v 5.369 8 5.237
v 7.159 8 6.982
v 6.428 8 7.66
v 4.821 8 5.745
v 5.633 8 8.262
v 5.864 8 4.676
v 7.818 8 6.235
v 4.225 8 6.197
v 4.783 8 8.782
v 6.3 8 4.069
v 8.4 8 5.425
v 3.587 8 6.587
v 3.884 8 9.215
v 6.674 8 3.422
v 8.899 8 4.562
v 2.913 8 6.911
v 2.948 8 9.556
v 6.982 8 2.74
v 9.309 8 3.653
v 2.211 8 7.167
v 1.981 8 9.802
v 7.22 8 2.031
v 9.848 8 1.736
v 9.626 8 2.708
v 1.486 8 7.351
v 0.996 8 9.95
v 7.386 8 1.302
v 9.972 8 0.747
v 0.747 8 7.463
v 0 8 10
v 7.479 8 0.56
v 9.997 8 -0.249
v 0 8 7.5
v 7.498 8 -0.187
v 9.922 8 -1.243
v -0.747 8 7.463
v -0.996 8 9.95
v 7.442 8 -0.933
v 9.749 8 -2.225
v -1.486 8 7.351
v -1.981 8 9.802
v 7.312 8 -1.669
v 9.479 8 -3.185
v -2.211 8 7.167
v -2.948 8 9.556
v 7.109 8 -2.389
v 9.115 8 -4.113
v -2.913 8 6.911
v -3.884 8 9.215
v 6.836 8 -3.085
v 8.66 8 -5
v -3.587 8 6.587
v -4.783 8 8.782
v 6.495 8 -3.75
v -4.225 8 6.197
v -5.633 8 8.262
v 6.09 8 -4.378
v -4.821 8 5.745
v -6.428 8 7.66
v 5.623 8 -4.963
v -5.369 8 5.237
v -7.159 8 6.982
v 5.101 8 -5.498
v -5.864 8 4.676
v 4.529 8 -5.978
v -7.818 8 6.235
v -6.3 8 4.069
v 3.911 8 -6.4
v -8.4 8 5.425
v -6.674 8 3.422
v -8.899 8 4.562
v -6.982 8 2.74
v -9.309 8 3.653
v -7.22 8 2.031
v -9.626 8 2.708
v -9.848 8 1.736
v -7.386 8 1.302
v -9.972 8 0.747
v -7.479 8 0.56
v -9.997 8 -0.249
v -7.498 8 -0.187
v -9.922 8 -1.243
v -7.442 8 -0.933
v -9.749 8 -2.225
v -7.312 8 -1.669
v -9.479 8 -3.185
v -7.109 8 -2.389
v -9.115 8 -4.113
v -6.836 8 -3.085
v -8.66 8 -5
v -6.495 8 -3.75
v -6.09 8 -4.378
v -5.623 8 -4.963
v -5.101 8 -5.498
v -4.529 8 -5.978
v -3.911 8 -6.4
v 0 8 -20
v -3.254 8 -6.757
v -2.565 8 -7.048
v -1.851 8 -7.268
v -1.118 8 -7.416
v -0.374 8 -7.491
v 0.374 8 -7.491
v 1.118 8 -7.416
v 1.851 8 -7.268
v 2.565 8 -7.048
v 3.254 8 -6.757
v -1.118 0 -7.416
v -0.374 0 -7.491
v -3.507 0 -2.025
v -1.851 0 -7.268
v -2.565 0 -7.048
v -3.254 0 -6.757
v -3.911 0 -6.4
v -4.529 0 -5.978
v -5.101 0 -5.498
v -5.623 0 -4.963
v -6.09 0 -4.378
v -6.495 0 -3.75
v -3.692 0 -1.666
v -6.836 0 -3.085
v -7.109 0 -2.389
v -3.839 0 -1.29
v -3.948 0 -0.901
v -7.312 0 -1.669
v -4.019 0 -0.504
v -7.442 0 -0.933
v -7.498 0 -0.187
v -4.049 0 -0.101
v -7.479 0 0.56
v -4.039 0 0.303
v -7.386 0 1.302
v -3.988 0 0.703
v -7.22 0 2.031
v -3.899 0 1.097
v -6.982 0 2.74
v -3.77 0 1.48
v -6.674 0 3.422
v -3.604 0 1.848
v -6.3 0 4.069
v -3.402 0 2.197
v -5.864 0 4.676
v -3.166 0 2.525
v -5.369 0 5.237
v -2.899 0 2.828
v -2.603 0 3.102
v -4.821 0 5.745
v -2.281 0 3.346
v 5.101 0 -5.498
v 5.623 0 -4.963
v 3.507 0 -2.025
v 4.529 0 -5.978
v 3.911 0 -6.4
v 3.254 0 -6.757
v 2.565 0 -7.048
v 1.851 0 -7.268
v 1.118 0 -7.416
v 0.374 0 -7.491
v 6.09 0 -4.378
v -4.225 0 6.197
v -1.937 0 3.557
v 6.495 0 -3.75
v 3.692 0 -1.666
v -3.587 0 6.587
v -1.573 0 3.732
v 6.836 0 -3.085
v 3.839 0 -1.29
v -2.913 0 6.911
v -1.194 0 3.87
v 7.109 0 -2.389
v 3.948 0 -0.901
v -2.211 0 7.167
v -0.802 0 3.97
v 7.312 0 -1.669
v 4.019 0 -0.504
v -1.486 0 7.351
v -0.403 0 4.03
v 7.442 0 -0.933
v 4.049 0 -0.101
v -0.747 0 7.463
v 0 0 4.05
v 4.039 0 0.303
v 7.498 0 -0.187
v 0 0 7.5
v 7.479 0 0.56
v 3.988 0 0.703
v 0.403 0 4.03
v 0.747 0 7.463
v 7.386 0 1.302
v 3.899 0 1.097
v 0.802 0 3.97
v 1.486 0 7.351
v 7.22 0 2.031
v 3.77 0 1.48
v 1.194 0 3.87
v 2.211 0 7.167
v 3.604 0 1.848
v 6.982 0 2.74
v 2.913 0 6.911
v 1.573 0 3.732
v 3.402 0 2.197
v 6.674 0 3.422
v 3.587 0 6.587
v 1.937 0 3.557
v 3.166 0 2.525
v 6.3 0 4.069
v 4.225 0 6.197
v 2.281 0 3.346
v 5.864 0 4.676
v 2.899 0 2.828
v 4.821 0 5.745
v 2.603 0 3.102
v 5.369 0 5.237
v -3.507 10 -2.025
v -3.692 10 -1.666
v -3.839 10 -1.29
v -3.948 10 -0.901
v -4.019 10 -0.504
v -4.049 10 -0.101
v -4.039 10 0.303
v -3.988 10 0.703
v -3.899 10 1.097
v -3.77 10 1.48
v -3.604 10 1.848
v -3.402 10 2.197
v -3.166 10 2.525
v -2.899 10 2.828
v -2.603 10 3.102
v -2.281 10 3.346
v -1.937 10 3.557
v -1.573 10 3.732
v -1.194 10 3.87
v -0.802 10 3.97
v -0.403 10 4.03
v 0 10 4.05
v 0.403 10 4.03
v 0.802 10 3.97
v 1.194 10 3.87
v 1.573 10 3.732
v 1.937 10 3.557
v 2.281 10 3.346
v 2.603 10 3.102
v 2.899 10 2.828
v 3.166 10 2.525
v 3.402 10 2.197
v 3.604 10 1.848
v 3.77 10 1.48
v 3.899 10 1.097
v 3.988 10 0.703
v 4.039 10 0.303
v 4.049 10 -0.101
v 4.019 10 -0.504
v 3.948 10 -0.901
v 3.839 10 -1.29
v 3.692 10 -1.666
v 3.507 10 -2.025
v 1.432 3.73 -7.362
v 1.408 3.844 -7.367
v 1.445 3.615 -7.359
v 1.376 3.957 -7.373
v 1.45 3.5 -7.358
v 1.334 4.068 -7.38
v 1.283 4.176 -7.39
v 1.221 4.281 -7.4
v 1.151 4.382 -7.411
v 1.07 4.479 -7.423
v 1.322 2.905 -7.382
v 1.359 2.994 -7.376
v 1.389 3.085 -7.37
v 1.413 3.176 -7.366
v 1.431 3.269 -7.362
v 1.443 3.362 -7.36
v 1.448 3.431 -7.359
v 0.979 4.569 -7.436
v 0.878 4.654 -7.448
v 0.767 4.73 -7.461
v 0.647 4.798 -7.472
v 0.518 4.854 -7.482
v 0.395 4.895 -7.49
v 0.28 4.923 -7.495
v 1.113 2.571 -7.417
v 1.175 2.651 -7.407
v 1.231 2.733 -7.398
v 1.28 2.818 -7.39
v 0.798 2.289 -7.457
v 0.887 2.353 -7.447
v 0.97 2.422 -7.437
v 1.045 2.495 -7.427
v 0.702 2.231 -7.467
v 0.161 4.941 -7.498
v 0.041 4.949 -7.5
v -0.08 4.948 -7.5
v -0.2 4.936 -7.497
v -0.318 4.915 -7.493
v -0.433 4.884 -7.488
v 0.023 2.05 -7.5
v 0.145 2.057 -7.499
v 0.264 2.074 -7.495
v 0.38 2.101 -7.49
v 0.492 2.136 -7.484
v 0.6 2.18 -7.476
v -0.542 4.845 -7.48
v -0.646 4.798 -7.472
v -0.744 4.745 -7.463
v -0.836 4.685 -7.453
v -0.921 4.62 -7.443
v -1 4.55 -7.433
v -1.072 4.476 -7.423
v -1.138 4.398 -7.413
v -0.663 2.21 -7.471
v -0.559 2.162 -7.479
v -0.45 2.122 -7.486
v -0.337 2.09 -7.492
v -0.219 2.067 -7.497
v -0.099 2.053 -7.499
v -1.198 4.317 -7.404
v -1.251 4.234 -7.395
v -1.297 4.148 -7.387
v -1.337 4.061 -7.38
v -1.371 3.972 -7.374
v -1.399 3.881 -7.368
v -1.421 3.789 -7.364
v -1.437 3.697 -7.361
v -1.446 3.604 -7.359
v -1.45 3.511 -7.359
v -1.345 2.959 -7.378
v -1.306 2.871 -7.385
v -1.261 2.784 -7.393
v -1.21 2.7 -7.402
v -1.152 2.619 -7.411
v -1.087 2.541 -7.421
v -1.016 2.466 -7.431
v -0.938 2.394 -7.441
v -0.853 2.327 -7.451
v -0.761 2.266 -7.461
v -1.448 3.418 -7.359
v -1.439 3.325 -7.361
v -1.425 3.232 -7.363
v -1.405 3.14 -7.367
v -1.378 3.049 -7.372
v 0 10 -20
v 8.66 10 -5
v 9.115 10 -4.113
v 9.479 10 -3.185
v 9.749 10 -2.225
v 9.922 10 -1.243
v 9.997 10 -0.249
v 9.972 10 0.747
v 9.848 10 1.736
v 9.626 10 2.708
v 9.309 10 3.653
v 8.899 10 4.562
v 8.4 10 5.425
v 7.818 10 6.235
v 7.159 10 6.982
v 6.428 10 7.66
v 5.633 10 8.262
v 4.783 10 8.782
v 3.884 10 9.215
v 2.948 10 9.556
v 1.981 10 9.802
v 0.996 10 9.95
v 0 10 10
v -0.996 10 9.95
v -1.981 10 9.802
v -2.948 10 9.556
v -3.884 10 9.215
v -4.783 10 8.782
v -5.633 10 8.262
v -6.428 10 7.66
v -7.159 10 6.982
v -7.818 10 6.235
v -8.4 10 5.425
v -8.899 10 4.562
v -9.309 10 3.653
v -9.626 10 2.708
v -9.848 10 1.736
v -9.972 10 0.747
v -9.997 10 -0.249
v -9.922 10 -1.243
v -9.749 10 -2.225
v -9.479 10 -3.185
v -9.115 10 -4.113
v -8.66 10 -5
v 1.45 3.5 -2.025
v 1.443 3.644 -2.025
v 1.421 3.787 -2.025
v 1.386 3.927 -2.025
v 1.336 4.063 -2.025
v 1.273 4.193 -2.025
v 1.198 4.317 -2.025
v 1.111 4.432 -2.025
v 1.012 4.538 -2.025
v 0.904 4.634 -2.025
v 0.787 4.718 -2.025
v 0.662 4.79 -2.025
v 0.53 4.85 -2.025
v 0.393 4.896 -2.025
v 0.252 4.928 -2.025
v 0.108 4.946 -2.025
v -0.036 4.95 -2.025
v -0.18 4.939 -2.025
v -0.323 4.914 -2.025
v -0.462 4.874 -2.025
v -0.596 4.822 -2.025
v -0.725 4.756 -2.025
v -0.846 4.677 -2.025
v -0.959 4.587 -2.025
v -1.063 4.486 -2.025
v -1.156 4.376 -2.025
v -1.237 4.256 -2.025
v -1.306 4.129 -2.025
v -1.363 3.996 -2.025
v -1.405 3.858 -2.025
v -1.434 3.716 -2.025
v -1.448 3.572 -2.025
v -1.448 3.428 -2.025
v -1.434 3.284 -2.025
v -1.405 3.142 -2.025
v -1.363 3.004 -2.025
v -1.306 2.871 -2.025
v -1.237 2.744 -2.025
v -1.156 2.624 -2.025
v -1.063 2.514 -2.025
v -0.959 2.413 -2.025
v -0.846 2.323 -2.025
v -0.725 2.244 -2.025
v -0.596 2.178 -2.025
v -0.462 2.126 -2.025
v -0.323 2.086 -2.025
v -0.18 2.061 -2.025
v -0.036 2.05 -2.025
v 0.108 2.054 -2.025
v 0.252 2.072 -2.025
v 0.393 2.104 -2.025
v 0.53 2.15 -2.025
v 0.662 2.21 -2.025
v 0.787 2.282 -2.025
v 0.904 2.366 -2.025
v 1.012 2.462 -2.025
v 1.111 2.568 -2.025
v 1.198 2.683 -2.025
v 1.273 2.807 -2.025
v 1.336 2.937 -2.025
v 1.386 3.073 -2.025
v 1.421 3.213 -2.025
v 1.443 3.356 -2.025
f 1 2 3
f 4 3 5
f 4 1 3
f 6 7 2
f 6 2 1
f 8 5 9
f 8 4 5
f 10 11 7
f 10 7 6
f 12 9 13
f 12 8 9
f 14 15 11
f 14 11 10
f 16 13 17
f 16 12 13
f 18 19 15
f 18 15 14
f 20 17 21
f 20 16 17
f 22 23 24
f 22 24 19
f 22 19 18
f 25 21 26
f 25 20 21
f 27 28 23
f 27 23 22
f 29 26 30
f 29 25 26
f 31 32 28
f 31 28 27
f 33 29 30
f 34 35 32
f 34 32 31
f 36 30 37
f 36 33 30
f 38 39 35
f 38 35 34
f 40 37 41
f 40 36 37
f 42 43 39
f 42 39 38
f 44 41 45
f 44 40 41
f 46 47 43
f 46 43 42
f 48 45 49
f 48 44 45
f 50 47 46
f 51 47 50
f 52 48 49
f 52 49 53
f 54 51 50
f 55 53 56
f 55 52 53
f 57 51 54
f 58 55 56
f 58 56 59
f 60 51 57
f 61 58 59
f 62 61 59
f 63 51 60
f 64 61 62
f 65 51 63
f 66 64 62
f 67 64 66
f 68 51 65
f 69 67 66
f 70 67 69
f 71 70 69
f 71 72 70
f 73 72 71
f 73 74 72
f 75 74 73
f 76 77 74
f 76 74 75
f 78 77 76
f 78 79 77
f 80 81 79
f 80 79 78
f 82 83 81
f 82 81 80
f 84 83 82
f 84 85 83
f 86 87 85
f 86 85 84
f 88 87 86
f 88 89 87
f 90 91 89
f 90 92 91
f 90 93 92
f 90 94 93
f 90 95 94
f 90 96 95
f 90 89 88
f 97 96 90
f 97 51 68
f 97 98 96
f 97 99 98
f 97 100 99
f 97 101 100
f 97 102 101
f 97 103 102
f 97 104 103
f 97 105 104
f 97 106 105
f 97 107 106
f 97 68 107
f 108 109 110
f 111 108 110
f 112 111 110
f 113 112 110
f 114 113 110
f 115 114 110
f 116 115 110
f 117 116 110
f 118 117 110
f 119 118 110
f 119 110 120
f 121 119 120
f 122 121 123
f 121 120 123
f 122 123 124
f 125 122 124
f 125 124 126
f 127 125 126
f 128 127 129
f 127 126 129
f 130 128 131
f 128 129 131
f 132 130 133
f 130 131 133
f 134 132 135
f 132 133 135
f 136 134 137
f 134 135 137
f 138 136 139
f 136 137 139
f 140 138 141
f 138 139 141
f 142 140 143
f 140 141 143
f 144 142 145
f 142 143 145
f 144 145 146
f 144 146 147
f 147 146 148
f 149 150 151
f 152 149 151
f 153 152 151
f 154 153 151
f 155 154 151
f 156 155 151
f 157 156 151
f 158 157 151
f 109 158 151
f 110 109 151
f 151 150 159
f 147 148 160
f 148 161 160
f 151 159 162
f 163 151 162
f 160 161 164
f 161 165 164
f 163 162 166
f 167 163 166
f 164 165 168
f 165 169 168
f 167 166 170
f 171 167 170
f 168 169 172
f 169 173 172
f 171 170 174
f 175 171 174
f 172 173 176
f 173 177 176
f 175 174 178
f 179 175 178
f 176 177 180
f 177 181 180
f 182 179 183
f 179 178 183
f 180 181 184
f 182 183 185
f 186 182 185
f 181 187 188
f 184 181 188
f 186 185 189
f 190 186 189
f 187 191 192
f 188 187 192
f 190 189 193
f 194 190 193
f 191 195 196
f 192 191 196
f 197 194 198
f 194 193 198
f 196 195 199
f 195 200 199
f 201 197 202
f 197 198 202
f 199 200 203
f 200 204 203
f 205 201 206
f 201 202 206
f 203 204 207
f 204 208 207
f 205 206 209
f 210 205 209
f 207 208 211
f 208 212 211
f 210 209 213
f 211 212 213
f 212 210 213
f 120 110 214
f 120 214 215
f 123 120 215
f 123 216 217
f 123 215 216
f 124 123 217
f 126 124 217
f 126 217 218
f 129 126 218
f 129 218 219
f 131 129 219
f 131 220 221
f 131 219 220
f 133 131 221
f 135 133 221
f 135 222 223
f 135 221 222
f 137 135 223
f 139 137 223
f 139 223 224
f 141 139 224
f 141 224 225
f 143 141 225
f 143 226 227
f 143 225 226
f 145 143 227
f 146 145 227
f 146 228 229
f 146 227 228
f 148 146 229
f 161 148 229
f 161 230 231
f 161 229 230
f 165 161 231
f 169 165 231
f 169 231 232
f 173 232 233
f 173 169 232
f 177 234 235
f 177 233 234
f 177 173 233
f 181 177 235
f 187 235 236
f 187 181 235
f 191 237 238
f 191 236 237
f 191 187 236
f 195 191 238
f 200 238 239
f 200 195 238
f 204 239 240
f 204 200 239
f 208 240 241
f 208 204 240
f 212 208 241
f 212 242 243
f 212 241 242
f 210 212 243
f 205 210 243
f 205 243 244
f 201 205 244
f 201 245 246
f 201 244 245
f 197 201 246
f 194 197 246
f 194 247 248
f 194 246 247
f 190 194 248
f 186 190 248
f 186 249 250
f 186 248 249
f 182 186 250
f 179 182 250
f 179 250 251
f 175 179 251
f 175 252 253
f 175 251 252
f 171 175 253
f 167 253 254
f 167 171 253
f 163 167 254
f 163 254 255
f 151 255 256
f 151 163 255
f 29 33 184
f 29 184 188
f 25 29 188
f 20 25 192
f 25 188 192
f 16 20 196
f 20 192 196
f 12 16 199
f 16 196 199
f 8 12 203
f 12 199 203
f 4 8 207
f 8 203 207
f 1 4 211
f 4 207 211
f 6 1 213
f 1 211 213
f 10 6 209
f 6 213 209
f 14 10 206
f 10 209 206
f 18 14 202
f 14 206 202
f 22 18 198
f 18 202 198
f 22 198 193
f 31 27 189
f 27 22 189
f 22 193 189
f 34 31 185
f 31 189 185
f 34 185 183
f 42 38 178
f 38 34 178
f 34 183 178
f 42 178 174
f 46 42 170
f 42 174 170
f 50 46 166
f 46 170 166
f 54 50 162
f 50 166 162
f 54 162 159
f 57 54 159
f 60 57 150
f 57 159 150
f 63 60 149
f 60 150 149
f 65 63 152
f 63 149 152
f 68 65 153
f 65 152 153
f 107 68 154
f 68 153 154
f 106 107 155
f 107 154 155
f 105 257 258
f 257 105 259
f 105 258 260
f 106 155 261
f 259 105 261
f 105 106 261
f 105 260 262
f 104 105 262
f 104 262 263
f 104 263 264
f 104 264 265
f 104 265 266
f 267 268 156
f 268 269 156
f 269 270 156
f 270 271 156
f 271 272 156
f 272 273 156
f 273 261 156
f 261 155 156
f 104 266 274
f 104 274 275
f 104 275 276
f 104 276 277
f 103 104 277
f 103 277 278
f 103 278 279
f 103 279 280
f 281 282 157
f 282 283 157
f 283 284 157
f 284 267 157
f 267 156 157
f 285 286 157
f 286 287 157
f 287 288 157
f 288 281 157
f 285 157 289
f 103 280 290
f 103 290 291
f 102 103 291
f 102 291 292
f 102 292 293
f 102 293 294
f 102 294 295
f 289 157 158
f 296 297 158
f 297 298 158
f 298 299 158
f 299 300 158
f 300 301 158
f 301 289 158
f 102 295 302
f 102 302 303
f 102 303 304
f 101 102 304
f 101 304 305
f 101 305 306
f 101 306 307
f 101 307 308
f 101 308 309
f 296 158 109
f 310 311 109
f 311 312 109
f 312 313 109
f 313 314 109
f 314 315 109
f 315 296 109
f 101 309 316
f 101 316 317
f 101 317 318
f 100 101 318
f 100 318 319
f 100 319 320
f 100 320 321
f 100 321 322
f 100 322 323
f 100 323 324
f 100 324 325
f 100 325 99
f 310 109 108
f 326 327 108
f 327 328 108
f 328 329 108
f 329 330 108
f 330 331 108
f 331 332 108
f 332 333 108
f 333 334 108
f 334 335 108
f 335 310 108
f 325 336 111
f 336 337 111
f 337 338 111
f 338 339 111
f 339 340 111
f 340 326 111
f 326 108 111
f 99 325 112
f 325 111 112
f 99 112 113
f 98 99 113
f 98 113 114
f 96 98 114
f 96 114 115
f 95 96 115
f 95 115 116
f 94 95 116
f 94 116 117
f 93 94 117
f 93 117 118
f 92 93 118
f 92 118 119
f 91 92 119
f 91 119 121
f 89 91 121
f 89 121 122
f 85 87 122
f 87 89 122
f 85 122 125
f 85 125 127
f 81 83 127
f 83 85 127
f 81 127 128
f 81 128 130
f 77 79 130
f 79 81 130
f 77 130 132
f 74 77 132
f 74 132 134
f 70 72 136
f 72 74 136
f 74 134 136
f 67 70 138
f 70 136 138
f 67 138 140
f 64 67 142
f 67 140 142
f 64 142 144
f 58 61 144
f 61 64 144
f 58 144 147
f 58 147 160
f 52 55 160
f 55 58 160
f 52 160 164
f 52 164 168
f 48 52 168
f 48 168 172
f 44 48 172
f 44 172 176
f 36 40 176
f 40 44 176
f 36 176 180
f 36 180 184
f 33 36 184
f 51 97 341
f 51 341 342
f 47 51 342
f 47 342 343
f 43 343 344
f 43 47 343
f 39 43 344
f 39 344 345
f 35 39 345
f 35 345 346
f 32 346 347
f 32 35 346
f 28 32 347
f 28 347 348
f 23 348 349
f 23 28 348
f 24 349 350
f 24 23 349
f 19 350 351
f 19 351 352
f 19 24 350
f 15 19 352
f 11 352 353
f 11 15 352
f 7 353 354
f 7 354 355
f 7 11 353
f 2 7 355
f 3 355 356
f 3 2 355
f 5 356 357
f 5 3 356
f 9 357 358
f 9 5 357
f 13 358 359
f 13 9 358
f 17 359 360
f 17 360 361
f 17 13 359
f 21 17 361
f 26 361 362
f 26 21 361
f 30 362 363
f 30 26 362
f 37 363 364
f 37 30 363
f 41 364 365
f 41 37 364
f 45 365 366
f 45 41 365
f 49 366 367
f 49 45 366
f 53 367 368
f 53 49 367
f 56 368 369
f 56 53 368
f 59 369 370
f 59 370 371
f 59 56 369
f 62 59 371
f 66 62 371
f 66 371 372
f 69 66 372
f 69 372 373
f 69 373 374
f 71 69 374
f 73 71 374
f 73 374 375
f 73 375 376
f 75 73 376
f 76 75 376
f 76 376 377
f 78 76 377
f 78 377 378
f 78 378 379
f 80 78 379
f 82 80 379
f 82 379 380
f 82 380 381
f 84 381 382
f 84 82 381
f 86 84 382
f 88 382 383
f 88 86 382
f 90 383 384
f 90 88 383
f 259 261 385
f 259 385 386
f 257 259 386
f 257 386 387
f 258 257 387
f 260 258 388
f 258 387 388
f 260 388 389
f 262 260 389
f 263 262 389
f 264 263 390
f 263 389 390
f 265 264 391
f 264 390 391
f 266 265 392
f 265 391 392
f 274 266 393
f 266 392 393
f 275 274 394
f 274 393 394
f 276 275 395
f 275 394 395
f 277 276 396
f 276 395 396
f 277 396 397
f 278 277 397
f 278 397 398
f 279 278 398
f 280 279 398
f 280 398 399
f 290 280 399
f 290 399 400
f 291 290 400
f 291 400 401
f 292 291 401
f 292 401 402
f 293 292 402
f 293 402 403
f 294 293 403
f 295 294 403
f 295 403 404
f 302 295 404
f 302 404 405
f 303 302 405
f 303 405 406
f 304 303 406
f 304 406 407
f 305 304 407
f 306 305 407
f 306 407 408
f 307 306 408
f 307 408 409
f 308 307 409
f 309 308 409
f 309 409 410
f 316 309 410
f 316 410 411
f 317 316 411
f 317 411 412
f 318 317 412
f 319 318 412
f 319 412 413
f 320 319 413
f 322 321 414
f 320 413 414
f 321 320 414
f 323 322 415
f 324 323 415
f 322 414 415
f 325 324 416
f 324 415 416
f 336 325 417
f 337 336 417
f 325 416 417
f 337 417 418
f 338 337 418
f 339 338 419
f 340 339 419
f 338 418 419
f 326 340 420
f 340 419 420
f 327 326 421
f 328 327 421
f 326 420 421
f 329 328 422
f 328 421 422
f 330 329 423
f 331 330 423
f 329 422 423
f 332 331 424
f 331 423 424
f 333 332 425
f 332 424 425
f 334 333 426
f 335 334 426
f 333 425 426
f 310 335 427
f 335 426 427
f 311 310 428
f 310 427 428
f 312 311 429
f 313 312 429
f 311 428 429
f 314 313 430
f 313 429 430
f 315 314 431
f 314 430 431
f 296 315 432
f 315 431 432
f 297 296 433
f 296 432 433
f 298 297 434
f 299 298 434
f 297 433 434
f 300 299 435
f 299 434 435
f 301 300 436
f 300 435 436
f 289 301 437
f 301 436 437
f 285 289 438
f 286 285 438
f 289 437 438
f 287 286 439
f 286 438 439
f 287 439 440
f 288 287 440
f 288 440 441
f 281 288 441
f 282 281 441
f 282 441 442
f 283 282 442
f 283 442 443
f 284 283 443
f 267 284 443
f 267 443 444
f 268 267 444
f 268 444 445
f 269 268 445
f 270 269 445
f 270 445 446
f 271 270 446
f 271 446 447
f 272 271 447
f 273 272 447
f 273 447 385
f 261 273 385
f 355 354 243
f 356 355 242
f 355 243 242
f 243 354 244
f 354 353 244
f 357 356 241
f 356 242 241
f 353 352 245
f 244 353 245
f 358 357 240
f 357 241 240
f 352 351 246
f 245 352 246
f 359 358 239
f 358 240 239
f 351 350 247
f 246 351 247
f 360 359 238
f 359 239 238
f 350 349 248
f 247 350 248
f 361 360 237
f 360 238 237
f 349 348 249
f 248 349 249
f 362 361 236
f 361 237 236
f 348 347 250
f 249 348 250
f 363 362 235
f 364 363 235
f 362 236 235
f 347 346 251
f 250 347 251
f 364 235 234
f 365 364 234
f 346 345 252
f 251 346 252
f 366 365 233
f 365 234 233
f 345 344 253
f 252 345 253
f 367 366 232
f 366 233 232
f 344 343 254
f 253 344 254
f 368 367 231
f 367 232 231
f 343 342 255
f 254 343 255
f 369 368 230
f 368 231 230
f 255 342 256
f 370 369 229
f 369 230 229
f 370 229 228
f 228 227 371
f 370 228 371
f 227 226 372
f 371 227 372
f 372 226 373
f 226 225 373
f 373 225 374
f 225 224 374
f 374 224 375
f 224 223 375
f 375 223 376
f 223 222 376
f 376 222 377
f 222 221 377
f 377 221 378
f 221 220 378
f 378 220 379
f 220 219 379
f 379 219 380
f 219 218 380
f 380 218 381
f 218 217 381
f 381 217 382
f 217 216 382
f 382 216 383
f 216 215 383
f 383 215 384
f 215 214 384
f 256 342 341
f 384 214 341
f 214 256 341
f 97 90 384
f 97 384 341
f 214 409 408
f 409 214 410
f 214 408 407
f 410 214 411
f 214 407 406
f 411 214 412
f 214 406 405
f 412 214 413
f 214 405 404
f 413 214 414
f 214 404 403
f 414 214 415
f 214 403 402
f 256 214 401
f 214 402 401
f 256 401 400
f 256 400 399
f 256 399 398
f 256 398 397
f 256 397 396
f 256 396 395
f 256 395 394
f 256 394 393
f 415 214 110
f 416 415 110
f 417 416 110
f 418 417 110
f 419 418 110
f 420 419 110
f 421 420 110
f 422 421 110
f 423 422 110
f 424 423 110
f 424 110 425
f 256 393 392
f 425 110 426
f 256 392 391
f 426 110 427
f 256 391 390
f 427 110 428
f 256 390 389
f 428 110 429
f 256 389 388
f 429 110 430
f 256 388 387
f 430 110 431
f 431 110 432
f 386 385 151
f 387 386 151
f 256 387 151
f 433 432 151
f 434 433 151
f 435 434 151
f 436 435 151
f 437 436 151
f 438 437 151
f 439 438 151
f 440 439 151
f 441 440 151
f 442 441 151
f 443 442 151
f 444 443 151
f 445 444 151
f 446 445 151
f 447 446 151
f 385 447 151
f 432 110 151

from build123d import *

# Parameters (mm, degrees)
SKETCH_1_R          = 7.5
SKETCH_1_R_2        = 4.05
EXTRUDE_1_DEPTH     = 10
EXTRUDE_START       = -2
SKETCH_2_R          = 4.05
EXTRUDE_2_DEPTH     = 2
EXTRUDE_3_DEPTH     = 10
SKETCH_4_R          = 1.45
CUT_EXTRUDE_1_DEPTH = 10


with BuildPart() as part:
    # 草图1 → 凸台-拉伸1 (new body)
    with BuildSketch(Plane(origin=(0, 0, 0), x_dir=(1, 0, 0), z_dir=(0, 1, 0))):
        with Locations(Location((0, 0, 0), (0, 0, 270))):
            Circle(SKETCH_1_R)
        with Locations(Location((0, 0, 0), (0, 0, 270))):
            Circle(SKETCH_1_R_2, mode=Mode.SUBTRACT)
    extrude(amount=EXTRUDE_1_DEPTH)

    # 草图2 → 凸台-拉伸2 (add)
    with BuildSketch(Plane(origin=(0, 10, 0), x_dir=(1, 0, 0), z_dir=(0, 1, 0)).offset(EXTRUDE_START)):
        with BuildLine():
            Line((-8.660254038, 5), (0, 20))
            Line((0, 20), (8.660254038, 5))
            ThreePointArc((8.660254038, 5), (0, -10), (-8.660254038, 5))
        make_face()
        with Locations(Location((0, 0, 0), (0, 0, 270))):
            Circle(SKETCH_2_R, mode=Mode.SUBTRACT)
    extrude(amount=EXTRUDE_2_DEPTH)

    # 草图3 → 凸台-拉伸3 (add)
    with BuildSketch(Plane.XZ):
        with BuildLine():
            Line((-3.507402885, -2.025), (3.507402885, -2.025))
            ThreePointArc((3.507402885, -2.025), (0, -4.05), (-3.507402885, -2.025))
        make_face()
    extrude(amount=-EXTRUDE_3_DEPTH)

    # 草图4 → 切除-拉伸1 (cut)
    with BuildSketch(Plane.XY):
        with Locations((0, 3.5)):
            Circle(SKETCH_4_R)
    extrude(amount=-CUT_EXTRUDE_1_DEPTH, mode=Mode.SUBTRACT)


solid = part.part
